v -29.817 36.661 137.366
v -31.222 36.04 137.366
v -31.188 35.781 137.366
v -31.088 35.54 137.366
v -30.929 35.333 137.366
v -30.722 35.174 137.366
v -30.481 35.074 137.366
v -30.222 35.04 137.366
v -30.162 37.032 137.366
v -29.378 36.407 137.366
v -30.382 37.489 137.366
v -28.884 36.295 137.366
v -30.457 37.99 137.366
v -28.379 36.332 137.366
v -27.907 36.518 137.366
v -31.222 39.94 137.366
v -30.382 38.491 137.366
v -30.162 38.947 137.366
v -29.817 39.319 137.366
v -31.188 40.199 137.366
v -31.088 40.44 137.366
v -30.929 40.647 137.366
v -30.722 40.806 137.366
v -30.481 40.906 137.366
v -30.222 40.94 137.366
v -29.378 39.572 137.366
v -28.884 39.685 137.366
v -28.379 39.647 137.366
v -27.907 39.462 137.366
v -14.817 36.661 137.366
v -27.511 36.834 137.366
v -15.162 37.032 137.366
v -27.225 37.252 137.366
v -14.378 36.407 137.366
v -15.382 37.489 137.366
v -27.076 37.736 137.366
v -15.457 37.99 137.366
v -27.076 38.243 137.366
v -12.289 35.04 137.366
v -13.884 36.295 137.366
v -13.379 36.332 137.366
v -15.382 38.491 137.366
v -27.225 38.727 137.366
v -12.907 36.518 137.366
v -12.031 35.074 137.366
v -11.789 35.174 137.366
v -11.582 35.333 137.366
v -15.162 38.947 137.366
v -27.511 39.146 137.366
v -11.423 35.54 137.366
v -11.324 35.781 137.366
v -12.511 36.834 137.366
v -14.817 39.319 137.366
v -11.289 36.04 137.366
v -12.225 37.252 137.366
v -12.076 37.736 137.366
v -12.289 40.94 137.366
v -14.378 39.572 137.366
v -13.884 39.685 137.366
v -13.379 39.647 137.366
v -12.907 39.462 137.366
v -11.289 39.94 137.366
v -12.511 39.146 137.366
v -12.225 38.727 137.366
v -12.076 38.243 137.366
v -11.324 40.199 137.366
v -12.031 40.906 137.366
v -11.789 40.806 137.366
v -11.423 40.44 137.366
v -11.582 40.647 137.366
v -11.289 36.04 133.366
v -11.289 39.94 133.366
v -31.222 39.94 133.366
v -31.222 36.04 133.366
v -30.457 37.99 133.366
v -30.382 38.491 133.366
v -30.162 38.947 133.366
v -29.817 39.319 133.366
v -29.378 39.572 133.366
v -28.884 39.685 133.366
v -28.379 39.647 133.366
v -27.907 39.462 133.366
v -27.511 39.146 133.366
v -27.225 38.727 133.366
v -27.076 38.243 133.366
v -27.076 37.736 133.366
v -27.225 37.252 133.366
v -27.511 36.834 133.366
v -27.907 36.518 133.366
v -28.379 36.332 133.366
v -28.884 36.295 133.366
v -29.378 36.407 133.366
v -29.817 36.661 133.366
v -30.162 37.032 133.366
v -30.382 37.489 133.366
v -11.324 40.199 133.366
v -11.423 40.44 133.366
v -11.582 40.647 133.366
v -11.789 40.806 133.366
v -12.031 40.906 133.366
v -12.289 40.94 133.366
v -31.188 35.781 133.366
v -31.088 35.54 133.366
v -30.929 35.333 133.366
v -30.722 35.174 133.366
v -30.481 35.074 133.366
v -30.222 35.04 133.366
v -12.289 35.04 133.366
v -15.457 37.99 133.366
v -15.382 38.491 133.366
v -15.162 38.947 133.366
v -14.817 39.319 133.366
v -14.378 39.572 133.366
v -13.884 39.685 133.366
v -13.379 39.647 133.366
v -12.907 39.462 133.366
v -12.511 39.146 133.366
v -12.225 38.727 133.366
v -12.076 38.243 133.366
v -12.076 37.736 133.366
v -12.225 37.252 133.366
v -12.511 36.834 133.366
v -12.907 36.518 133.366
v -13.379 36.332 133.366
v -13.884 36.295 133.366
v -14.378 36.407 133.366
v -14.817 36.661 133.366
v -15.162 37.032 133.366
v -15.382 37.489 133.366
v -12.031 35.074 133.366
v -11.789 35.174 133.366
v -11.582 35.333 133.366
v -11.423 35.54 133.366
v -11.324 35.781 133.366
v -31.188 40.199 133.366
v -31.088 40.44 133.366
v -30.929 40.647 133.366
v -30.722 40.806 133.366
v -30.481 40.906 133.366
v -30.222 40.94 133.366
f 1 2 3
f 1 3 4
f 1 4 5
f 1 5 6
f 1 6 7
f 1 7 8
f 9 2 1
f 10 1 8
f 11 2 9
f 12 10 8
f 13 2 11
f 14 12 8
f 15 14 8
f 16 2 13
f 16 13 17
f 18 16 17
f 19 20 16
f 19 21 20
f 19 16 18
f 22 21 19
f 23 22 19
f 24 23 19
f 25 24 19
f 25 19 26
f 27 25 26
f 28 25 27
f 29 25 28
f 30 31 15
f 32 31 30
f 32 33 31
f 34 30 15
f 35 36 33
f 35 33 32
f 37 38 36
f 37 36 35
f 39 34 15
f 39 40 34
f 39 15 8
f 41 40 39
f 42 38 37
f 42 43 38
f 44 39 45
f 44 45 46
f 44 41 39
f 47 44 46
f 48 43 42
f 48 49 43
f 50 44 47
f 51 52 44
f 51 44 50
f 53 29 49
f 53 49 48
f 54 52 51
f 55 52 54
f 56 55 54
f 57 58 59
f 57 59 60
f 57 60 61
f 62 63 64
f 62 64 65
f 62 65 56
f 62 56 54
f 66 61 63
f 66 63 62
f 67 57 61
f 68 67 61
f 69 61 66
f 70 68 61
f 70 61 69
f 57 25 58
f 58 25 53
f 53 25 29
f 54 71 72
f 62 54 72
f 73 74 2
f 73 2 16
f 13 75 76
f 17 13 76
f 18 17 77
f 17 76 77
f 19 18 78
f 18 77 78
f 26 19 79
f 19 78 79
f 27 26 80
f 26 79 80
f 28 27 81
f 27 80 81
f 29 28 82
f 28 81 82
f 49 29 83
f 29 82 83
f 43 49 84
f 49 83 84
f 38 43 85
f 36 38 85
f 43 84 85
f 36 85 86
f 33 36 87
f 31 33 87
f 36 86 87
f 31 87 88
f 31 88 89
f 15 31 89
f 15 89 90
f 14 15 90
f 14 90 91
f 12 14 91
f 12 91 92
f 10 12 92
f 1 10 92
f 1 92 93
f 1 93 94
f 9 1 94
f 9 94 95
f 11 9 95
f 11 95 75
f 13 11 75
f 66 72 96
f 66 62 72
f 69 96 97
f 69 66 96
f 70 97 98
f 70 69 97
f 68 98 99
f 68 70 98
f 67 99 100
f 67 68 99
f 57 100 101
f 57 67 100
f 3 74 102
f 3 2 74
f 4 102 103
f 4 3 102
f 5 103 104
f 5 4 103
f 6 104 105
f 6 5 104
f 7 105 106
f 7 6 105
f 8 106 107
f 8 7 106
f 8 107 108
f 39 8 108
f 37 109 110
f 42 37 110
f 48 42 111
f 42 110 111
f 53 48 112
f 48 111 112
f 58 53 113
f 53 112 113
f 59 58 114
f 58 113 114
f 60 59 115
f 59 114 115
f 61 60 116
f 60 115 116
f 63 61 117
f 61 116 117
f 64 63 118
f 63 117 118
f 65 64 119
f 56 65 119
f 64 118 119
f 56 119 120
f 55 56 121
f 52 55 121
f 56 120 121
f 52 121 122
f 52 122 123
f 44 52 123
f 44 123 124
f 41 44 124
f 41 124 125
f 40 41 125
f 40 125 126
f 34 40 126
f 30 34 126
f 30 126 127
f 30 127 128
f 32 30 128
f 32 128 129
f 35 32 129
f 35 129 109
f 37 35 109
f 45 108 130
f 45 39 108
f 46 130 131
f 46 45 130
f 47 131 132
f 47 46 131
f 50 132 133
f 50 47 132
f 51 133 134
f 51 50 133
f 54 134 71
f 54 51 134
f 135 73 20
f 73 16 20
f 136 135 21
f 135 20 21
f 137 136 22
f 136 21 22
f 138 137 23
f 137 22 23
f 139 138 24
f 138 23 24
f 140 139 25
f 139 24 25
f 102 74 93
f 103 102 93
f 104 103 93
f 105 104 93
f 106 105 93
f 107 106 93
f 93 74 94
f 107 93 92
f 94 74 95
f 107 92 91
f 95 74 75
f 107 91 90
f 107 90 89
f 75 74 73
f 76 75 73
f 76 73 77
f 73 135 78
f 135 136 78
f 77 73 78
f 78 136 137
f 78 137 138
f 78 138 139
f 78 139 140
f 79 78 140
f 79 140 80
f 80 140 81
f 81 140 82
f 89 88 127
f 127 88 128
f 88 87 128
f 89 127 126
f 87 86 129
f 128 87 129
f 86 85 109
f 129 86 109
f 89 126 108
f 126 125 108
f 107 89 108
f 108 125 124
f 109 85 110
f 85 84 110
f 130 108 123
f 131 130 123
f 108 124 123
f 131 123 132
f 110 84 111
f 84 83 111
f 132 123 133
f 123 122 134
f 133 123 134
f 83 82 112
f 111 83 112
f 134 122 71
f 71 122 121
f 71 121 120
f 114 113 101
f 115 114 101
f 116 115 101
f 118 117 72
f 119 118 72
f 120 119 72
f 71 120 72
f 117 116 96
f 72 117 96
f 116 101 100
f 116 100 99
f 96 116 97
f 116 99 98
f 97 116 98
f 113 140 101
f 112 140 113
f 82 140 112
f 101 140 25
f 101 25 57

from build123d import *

# Parameters (mm, degrees)
SKETCH2_W                = 19.932631385
SKETCH2_H                = 5.9
BOSS_EXTRUDE1_DEPTH      = 4
FILLET1_R                = 1
M3_CLEARANCE_HOLE1_D     = 3.4
M3_CLEARANCE_HOLE1_DEPTH = 16.5
M3_CLEARANCE_HOLE1_TIP   = 1.021463052


with BuildPart() as part:
    # Sketch2 → Boss-Extrude1 (new body)
    with BuildSketch(Plane.XY.offset(133.365661293)):
        with Locations((-21.255805031, 37.989811256)):
            Rectangle(SKETCH2_W, SKETCH2_H)
    extrude(amount=BOSS_EXTRUDE1_DEPTH)

    # Fillet1
    fillet1_edges = [part.edges().sort_by_distance(p)[0] for p in [
        (-31.222120723, 40.939811256, 135.365661293),
        (-11.289489338, 40.939811256, 135.365661293),
        (-11.289489338, 35.039811256, 135.365661293),
        (-31.222120723, 35.039811256, 135.365661293),
    ]]
    fillet(fillet1_edges, radius=FILLET1_R)

    # M3 Clearance Hole1
    with Locations(Plane.XY.offset(137.365661293)):
        with Locations((-28.757120723, 37.989811256), (-13.757120723, 37.989811256)):
            Hole(M3_CLEARANCE_HOLE1_D / 2, depth=M3_CLEARANCE_HOLE1_DEPTH)
            with Locations((0, 0, -(M3_CLEARANCE_HOLE1_DEPTH + M3_CLEARANCE_HOLE1_TIP / 2))):  # 118° drill point
                Cone(0, M3_CLEARANCE_HOLE1_D / 2, M3_CLEARANCE_HOLE1_TIP, mode=Mode.SUBTRACT)


solid = part.part
